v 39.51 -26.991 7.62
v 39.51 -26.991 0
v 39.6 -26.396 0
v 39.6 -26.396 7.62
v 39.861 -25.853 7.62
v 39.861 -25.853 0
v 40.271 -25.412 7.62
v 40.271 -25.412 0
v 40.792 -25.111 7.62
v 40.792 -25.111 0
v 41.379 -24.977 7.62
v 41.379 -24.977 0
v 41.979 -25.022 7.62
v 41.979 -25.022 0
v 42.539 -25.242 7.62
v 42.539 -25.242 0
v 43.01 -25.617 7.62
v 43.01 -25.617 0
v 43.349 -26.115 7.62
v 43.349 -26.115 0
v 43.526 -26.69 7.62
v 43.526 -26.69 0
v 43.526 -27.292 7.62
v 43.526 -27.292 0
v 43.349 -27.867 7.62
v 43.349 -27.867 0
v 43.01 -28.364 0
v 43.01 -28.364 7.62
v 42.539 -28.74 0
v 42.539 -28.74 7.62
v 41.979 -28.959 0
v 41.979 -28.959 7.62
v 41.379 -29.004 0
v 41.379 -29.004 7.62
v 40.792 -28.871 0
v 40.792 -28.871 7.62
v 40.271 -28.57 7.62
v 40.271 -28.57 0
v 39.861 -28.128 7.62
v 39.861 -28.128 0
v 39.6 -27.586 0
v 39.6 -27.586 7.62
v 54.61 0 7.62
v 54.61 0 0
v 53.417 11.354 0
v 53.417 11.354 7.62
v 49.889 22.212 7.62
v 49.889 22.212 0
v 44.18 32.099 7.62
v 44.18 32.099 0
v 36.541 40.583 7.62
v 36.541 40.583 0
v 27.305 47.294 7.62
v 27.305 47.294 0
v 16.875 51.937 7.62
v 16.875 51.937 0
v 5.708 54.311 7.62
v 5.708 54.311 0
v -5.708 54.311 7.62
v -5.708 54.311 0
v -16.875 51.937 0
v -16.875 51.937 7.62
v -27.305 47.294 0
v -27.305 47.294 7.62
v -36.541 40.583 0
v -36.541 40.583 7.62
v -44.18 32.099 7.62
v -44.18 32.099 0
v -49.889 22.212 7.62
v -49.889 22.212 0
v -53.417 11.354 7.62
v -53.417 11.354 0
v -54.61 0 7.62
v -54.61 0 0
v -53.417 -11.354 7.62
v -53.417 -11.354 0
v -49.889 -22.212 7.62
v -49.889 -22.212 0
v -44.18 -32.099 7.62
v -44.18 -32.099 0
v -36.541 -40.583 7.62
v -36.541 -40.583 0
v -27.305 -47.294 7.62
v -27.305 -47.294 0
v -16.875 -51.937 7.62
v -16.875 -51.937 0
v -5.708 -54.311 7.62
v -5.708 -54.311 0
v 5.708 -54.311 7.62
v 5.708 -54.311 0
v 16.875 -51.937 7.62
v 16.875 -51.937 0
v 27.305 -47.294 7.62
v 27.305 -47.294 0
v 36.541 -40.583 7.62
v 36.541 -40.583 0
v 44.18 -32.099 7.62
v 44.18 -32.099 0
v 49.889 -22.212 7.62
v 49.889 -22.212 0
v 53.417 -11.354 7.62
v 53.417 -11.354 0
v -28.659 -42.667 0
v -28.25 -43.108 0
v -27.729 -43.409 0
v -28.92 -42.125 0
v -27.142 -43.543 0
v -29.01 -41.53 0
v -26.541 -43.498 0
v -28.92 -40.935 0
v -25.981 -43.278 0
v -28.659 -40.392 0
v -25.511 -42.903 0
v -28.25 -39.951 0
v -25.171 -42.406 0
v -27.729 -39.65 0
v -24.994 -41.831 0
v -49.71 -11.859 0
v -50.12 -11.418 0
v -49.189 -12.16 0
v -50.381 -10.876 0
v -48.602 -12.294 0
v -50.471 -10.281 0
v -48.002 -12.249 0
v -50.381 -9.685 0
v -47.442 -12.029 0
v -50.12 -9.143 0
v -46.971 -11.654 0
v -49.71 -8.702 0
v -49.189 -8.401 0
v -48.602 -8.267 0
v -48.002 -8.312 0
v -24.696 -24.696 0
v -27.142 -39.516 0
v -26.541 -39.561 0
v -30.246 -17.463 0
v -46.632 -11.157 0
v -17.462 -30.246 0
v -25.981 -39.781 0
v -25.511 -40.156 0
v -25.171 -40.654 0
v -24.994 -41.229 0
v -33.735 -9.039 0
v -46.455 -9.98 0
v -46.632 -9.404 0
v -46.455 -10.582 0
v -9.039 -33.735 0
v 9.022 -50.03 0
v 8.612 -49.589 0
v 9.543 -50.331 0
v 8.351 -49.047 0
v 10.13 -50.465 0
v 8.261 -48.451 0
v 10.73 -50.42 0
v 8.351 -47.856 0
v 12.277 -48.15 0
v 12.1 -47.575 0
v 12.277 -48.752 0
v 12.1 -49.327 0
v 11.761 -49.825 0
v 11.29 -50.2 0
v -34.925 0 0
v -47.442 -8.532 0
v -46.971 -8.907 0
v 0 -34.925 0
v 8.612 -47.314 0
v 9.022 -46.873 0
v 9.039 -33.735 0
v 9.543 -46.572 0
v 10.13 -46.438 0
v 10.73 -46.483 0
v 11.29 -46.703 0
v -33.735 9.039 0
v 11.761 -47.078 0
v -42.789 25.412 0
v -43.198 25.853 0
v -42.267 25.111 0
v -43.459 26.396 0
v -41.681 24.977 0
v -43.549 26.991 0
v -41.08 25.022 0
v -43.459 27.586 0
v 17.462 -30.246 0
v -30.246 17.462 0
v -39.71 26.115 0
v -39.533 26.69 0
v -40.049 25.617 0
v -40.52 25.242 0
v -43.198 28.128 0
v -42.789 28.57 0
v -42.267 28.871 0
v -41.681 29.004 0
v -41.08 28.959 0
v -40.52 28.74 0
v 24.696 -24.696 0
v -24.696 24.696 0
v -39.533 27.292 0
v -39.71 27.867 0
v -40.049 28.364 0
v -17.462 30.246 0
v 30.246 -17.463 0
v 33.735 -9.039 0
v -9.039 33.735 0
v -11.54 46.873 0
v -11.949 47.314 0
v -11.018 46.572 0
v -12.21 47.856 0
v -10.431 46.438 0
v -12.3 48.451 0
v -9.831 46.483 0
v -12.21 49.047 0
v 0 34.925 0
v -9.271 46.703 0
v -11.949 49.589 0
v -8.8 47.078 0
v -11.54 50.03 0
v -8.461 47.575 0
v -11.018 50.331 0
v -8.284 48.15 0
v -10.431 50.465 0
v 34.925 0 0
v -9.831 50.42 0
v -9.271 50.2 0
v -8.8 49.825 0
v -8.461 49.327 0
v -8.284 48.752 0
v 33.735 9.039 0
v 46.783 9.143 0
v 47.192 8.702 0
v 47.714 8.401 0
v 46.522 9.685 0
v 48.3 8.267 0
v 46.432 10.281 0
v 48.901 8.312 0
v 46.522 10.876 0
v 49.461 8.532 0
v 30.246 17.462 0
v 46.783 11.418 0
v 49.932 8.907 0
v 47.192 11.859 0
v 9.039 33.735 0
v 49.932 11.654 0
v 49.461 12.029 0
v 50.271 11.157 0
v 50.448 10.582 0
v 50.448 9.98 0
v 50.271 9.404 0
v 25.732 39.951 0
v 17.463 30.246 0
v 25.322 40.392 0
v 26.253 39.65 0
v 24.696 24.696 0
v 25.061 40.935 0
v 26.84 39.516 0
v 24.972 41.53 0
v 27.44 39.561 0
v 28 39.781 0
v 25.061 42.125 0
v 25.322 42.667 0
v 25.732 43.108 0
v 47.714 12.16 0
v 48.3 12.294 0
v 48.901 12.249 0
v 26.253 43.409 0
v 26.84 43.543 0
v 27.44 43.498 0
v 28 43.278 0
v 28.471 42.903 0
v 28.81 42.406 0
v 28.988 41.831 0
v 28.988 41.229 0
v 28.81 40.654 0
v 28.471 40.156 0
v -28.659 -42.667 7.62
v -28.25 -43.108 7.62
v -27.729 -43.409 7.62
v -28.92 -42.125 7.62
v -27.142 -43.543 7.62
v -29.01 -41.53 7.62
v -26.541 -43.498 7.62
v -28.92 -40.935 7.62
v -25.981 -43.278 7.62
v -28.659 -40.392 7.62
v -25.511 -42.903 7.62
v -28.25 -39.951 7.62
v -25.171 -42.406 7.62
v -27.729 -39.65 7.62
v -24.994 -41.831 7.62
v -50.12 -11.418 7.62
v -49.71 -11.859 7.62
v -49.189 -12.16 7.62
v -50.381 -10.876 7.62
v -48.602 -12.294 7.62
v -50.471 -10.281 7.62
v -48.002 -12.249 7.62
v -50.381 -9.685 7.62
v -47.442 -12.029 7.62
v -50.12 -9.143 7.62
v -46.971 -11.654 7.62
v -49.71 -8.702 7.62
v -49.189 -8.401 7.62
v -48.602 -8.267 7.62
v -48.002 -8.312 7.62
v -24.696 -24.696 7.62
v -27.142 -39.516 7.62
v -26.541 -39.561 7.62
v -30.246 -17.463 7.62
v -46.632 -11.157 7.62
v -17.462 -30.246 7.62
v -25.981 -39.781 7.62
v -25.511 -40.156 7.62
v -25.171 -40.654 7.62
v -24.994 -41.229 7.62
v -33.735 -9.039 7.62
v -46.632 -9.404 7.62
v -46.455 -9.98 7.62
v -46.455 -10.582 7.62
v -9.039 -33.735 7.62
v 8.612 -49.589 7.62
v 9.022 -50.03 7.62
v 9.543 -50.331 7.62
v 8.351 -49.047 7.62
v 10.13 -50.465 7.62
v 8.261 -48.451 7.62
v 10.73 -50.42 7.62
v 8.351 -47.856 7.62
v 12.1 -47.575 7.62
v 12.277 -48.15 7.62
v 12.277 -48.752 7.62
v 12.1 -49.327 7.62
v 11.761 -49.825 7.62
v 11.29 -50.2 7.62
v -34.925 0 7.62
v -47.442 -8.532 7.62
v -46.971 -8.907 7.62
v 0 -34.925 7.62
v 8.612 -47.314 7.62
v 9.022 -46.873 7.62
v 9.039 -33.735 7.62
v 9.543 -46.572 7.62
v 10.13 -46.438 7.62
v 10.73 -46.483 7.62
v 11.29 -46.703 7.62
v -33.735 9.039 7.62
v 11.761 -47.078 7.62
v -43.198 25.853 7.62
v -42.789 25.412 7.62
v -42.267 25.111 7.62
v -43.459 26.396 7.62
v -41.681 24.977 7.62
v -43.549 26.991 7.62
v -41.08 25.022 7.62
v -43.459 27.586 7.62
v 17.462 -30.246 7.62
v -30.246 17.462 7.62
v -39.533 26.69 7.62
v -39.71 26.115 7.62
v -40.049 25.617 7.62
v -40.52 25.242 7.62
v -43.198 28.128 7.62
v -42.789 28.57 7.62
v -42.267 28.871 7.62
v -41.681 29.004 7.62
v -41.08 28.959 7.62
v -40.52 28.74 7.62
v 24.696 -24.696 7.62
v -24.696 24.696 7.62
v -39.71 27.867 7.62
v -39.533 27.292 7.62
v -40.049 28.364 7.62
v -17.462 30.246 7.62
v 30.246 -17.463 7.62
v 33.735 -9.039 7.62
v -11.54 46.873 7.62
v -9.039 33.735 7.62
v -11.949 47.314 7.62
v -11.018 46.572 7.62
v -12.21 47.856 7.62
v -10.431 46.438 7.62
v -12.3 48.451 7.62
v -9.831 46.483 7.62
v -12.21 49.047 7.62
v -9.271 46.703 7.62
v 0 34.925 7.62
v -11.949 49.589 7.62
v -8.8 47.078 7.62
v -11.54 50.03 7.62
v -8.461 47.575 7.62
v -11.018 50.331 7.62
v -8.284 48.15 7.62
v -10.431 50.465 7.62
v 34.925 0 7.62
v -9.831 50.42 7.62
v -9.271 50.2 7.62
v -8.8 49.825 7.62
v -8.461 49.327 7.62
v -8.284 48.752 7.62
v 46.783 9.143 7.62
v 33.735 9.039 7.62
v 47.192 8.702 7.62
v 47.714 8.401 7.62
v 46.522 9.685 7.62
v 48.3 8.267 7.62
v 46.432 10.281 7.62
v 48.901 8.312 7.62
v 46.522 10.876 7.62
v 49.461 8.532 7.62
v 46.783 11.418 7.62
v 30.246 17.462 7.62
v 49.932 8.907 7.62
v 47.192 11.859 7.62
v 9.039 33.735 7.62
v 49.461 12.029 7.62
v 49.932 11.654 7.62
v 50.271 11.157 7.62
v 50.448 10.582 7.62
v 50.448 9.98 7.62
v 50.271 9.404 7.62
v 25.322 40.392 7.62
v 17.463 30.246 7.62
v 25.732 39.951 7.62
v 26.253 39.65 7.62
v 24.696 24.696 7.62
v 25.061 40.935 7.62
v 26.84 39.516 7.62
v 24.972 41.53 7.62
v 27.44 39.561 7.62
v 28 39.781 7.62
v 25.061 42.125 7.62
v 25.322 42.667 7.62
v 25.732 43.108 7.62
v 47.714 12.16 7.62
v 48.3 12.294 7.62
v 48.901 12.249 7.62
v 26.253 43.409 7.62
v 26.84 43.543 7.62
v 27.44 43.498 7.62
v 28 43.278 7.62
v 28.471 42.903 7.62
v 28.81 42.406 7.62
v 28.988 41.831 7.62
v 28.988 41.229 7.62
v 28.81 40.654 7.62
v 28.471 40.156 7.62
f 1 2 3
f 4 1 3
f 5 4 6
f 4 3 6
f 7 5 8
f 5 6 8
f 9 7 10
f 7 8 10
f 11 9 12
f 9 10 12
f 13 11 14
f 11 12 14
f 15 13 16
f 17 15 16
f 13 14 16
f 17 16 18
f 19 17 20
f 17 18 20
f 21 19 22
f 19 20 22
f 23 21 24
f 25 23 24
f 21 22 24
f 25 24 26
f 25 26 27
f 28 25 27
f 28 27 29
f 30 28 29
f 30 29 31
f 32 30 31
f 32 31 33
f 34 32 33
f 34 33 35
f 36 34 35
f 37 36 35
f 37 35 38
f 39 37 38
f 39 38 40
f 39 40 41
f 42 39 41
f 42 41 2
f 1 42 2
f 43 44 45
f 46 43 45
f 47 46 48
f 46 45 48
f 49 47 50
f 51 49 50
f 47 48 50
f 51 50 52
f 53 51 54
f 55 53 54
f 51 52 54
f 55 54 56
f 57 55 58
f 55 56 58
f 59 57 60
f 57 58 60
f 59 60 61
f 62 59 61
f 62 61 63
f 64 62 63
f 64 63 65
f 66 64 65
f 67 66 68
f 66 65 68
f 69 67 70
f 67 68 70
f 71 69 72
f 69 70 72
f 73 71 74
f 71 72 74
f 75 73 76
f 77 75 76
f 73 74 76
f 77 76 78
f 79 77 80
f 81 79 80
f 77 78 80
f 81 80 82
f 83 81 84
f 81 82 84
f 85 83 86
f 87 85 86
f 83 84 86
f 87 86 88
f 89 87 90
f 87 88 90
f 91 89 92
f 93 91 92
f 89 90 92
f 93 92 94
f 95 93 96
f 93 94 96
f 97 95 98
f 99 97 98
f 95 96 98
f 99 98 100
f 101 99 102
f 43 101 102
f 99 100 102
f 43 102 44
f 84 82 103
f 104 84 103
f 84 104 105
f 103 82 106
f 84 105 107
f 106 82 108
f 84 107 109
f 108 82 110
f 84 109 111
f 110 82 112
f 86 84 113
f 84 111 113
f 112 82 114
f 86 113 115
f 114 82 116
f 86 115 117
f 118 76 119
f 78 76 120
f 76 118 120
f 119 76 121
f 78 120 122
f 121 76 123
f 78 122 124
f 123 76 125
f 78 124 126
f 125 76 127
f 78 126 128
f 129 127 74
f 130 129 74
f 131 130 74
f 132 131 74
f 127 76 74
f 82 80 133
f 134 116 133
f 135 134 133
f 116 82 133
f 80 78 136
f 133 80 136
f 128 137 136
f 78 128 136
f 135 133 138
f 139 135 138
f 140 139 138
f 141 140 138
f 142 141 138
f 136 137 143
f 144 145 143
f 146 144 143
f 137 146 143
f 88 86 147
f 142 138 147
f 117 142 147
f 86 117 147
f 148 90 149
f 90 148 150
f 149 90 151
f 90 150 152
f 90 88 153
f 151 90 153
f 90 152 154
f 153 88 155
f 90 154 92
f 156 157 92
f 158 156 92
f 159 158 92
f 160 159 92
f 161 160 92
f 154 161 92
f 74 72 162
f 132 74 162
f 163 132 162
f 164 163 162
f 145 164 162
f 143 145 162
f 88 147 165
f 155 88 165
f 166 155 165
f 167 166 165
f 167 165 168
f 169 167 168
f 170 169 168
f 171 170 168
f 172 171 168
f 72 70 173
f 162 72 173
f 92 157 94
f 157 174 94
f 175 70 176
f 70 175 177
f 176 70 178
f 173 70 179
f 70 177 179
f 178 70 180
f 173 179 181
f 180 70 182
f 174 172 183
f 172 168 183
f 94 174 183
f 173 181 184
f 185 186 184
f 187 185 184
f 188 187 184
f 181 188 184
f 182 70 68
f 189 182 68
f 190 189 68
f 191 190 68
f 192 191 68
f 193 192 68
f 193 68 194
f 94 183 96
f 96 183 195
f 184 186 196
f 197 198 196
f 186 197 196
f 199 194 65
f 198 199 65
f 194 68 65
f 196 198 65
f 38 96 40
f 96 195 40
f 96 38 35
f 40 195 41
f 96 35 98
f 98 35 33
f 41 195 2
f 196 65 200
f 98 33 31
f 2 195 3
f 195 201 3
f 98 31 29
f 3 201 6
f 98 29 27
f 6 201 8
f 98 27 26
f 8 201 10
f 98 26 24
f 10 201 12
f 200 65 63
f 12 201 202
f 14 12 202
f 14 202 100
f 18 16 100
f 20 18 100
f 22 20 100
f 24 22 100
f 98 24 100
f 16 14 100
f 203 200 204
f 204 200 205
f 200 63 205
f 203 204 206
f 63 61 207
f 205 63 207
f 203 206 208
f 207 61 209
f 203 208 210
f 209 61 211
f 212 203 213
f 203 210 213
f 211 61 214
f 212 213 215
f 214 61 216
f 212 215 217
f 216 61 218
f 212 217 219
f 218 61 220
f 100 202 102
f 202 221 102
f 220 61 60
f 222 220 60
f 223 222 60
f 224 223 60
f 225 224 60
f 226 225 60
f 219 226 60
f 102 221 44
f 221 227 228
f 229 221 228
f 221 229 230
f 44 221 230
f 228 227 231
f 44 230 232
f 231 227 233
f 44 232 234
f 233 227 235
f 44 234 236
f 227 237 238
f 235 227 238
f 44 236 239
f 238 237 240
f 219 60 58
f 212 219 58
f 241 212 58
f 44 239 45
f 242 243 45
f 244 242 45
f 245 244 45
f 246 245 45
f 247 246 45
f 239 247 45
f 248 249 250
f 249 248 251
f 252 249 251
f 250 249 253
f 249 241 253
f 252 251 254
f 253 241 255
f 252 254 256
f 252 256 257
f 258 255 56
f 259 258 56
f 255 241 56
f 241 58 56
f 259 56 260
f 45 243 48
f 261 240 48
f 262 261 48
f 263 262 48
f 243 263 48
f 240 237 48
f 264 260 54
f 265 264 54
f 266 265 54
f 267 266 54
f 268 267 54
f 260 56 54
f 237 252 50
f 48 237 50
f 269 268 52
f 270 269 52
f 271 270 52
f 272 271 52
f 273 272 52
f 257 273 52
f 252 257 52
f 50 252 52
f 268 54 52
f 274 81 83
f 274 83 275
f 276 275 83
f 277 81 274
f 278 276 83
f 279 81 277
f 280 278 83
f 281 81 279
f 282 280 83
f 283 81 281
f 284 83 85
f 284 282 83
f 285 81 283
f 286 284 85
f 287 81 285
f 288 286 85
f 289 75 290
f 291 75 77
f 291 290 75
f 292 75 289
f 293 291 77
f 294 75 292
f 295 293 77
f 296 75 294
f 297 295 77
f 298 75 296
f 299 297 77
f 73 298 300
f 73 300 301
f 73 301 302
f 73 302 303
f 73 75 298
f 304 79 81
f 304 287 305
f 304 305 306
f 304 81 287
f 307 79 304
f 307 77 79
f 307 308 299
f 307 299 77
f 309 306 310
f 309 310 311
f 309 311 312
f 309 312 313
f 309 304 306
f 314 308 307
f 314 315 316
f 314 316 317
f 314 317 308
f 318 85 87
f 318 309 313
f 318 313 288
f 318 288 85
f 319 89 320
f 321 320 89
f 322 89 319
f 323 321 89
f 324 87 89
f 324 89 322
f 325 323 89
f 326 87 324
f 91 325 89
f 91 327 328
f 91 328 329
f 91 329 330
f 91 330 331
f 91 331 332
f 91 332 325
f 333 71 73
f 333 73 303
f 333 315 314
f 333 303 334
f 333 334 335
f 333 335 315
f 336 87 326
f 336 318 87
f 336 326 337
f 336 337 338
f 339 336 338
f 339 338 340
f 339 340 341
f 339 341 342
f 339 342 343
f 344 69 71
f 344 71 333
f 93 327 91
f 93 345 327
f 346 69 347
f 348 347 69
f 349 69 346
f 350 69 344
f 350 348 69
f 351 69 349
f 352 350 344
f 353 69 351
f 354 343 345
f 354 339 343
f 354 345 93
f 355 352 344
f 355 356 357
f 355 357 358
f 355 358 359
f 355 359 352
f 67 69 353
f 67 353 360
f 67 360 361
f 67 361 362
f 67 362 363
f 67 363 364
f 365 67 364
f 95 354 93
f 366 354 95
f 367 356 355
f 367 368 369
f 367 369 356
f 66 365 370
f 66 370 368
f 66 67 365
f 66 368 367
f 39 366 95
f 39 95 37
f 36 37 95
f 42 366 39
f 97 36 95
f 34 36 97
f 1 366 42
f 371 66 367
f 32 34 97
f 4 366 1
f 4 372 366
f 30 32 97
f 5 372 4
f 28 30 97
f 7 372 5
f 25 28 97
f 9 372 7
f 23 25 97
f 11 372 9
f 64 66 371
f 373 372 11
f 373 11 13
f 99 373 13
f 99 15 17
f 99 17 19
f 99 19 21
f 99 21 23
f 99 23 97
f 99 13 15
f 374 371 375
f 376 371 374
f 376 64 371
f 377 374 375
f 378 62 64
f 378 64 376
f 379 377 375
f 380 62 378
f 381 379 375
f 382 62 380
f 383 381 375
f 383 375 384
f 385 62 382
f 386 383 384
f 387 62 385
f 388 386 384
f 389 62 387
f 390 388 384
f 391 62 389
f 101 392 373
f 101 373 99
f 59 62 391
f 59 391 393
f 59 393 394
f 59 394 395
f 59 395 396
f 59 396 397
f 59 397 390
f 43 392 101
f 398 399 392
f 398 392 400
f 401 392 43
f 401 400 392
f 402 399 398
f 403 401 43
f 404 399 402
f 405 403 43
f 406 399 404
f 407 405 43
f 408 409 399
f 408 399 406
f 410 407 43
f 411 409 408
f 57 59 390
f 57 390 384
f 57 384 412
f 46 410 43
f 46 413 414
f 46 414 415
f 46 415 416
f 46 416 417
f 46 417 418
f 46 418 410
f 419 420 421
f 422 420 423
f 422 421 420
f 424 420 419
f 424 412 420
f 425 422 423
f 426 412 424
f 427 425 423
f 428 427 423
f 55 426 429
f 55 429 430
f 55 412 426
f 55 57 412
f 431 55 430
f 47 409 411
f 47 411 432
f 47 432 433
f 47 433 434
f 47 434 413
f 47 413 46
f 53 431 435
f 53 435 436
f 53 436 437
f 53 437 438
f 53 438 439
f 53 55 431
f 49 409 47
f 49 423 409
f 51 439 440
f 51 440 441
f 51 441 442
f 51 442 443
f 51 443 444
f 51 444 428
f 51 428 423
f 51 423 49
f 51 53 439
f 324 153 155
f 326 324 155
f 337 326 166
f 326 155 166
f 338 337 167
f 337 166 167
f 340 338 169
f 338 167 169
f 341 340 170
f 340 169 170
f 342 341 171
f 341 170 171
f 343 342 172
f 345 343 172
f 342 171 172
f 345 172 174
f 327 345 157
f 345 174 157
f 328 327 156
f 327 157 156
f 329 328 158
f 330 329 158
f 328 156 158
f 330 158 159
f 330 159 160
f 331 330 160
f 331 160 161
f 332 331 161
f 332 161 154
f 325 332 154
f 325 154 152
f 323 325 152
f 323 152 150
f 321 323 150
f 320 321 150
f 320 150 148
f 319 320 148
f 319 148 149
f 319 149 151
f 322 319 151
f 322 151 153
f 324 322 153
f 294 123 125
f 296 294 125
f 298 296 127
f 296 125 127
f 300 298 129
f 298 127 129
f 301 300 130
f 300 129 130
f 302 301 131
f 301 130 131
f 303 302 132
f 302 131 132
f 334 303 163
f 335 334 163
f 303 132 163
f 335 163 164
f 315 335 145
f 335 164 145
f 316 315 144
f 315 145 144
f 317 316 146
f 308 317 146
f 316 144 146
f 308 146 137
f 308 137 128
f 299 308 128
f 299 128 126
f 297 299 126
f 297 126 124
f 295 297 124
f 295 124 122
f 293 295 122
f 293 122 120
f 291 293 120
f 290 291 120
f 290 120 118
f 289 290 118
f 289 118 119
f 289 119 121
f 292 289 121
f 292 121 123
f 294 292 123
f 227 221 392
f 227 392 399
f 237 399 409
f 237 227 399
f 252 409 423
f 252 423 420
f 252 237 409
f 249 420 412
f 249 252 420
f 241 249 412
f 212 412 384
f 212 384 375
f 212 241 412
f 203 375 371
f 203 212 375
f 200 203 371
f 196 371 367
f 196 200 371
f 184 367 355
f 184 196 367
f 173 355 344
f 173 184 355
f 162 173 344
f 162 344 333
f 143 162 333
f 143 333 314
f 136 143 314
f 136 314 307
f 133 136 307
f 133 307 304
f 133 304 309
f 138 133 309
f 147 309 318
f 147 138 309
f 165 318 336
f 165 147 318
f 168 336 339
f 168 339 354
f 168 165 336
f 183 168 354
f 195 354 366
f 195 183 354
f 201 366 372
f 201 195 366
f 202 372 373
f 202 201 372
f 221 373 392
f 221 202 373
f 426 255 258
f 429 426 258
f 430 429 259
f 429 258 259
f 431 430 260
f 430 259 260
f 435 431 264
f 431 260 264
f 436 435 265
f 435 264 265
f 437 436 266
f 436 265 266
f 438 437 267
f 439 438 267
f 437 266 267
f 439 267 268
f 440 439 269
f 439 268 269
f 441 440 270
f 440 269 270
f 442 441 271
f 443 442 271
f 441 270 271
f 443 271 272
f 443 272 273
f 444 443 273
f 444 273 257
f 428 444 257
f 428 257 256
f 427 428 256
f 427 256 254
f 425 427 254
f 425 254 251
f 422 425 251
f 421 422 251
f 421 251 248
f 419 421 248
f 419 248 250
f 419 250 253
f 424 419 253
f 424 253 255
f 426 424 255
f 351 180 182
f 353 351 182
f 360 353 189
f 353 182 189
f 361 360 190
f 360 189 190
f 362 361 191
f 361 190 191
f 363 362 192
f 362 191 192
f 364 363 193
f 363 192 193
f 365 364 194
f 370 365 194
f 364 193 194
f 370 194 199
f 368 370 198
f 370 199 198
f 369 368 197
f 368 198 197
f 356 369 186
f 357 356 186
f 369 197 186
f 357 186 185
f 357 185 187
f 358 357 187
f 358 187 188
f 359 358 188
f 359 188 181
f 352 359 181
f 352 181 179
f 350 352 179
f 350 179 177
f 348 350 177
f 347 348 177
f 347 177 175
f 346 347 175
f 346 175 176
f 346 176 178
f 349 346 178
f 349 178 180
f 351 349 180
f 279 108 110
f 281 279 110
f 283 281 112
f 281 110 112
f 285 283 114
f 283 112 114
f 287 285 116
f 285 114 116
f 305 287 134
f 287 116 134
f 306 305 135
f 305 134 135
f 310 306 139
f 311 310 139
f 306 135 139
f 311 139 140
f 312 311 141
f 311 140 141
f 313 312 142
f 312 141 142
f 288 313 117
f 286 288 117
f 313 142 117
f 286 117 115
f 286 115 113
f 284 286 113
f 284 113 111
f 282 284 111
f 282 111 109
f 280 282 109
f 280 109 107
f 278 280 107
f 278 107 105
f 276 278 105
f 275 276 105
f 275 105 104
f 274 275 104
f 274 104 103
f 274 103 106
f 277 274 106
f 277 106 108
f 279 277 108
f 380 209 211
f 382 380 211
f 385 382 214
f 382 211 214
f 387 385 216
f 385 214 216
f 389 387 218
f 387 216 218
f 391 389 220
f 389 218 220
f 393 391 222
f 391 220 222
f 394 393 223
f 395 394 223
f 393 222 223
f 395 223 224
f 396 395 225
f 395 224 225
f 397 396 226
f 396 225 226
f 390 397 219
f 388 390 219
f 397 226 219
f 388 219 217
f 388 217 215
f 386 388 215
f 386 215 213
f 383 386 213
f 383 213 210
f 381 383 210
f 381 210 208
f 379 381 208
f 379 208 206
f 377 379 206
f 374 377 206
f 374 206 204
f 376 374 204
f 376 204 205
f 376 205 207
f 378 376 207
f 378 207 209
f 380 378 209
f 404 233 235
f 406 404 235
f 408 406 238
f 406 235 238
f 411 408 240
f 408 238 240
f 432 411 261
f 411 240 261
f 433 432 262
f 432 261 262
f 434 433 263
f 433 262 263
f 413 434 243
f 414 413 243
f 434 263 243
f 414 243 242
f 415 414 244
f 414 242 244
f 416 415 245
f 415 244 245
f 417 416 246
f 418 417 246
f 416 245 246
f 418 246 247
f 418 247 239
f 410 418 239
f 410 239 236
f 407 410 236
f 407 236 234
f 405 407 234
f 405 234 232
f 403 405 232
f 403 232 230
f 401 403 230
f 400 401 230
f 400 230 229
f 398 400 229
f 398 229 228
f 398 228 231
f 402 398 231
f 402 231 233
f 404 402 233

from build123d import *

# Parameters (mm, degrees)
SKETCH1_R           = 54.61
SKETCH1_R_2         = 34.925
BOSS_EXTRUDE1_DEPTH = 7.62
SKETCH3_R           = 2.0193
CUT_EXTRUDE1_DEPTH  = 8.62


with BuildPart() as part:
    # Sketch1 → Boss-Extrude1 (new body)
    with BuildSketch(Plane.XY):
        Circle(SKETCH1_R)
        Circle(SKETCH1_R_2, mode=Mode.SUBTRACT)
    extrude(amount=BOSS_EXTRUDE1_DEPTH)

    # Sketch3 → Cut-Extrude1 (cut, through all)
    with BuildSketch(Plane(origin=(0, 0, 0), x_dir=(-1, 0, 0), z_dir=(0, 0, -1))):
        with Locations((41.529703671, 26.990824607)):
            Circle(SKETCH3_R)
        with Locations((10.280539977, 48.451330196)):
            Circle(SKETCH3_R)
        with Locations((-26.990824607, 41.529703671)):
            Circle(SKETCH3_R)
        with Locations((-48.451330196, 10.280539977)):
            Circle(SKETCH3_R)
        with Locations((-41.529703671, -26.990824607)):
            Circle(SKETCH3_R)
        with Locations((-10.280539977, -48.451330196)):
            Circle(SKETCH3_R)
        with Locations((26.990824607, -41.529703671)):
            Circle(SKETCH3_R)
        with Locations((48.451330196, -10.280539977)):
            Circle(SKETCH3_R)
    extrude(amount=-CUT_EXTRUDE1_DEPTH, mode=Mode.SUBTRACT)


solid = part.part
